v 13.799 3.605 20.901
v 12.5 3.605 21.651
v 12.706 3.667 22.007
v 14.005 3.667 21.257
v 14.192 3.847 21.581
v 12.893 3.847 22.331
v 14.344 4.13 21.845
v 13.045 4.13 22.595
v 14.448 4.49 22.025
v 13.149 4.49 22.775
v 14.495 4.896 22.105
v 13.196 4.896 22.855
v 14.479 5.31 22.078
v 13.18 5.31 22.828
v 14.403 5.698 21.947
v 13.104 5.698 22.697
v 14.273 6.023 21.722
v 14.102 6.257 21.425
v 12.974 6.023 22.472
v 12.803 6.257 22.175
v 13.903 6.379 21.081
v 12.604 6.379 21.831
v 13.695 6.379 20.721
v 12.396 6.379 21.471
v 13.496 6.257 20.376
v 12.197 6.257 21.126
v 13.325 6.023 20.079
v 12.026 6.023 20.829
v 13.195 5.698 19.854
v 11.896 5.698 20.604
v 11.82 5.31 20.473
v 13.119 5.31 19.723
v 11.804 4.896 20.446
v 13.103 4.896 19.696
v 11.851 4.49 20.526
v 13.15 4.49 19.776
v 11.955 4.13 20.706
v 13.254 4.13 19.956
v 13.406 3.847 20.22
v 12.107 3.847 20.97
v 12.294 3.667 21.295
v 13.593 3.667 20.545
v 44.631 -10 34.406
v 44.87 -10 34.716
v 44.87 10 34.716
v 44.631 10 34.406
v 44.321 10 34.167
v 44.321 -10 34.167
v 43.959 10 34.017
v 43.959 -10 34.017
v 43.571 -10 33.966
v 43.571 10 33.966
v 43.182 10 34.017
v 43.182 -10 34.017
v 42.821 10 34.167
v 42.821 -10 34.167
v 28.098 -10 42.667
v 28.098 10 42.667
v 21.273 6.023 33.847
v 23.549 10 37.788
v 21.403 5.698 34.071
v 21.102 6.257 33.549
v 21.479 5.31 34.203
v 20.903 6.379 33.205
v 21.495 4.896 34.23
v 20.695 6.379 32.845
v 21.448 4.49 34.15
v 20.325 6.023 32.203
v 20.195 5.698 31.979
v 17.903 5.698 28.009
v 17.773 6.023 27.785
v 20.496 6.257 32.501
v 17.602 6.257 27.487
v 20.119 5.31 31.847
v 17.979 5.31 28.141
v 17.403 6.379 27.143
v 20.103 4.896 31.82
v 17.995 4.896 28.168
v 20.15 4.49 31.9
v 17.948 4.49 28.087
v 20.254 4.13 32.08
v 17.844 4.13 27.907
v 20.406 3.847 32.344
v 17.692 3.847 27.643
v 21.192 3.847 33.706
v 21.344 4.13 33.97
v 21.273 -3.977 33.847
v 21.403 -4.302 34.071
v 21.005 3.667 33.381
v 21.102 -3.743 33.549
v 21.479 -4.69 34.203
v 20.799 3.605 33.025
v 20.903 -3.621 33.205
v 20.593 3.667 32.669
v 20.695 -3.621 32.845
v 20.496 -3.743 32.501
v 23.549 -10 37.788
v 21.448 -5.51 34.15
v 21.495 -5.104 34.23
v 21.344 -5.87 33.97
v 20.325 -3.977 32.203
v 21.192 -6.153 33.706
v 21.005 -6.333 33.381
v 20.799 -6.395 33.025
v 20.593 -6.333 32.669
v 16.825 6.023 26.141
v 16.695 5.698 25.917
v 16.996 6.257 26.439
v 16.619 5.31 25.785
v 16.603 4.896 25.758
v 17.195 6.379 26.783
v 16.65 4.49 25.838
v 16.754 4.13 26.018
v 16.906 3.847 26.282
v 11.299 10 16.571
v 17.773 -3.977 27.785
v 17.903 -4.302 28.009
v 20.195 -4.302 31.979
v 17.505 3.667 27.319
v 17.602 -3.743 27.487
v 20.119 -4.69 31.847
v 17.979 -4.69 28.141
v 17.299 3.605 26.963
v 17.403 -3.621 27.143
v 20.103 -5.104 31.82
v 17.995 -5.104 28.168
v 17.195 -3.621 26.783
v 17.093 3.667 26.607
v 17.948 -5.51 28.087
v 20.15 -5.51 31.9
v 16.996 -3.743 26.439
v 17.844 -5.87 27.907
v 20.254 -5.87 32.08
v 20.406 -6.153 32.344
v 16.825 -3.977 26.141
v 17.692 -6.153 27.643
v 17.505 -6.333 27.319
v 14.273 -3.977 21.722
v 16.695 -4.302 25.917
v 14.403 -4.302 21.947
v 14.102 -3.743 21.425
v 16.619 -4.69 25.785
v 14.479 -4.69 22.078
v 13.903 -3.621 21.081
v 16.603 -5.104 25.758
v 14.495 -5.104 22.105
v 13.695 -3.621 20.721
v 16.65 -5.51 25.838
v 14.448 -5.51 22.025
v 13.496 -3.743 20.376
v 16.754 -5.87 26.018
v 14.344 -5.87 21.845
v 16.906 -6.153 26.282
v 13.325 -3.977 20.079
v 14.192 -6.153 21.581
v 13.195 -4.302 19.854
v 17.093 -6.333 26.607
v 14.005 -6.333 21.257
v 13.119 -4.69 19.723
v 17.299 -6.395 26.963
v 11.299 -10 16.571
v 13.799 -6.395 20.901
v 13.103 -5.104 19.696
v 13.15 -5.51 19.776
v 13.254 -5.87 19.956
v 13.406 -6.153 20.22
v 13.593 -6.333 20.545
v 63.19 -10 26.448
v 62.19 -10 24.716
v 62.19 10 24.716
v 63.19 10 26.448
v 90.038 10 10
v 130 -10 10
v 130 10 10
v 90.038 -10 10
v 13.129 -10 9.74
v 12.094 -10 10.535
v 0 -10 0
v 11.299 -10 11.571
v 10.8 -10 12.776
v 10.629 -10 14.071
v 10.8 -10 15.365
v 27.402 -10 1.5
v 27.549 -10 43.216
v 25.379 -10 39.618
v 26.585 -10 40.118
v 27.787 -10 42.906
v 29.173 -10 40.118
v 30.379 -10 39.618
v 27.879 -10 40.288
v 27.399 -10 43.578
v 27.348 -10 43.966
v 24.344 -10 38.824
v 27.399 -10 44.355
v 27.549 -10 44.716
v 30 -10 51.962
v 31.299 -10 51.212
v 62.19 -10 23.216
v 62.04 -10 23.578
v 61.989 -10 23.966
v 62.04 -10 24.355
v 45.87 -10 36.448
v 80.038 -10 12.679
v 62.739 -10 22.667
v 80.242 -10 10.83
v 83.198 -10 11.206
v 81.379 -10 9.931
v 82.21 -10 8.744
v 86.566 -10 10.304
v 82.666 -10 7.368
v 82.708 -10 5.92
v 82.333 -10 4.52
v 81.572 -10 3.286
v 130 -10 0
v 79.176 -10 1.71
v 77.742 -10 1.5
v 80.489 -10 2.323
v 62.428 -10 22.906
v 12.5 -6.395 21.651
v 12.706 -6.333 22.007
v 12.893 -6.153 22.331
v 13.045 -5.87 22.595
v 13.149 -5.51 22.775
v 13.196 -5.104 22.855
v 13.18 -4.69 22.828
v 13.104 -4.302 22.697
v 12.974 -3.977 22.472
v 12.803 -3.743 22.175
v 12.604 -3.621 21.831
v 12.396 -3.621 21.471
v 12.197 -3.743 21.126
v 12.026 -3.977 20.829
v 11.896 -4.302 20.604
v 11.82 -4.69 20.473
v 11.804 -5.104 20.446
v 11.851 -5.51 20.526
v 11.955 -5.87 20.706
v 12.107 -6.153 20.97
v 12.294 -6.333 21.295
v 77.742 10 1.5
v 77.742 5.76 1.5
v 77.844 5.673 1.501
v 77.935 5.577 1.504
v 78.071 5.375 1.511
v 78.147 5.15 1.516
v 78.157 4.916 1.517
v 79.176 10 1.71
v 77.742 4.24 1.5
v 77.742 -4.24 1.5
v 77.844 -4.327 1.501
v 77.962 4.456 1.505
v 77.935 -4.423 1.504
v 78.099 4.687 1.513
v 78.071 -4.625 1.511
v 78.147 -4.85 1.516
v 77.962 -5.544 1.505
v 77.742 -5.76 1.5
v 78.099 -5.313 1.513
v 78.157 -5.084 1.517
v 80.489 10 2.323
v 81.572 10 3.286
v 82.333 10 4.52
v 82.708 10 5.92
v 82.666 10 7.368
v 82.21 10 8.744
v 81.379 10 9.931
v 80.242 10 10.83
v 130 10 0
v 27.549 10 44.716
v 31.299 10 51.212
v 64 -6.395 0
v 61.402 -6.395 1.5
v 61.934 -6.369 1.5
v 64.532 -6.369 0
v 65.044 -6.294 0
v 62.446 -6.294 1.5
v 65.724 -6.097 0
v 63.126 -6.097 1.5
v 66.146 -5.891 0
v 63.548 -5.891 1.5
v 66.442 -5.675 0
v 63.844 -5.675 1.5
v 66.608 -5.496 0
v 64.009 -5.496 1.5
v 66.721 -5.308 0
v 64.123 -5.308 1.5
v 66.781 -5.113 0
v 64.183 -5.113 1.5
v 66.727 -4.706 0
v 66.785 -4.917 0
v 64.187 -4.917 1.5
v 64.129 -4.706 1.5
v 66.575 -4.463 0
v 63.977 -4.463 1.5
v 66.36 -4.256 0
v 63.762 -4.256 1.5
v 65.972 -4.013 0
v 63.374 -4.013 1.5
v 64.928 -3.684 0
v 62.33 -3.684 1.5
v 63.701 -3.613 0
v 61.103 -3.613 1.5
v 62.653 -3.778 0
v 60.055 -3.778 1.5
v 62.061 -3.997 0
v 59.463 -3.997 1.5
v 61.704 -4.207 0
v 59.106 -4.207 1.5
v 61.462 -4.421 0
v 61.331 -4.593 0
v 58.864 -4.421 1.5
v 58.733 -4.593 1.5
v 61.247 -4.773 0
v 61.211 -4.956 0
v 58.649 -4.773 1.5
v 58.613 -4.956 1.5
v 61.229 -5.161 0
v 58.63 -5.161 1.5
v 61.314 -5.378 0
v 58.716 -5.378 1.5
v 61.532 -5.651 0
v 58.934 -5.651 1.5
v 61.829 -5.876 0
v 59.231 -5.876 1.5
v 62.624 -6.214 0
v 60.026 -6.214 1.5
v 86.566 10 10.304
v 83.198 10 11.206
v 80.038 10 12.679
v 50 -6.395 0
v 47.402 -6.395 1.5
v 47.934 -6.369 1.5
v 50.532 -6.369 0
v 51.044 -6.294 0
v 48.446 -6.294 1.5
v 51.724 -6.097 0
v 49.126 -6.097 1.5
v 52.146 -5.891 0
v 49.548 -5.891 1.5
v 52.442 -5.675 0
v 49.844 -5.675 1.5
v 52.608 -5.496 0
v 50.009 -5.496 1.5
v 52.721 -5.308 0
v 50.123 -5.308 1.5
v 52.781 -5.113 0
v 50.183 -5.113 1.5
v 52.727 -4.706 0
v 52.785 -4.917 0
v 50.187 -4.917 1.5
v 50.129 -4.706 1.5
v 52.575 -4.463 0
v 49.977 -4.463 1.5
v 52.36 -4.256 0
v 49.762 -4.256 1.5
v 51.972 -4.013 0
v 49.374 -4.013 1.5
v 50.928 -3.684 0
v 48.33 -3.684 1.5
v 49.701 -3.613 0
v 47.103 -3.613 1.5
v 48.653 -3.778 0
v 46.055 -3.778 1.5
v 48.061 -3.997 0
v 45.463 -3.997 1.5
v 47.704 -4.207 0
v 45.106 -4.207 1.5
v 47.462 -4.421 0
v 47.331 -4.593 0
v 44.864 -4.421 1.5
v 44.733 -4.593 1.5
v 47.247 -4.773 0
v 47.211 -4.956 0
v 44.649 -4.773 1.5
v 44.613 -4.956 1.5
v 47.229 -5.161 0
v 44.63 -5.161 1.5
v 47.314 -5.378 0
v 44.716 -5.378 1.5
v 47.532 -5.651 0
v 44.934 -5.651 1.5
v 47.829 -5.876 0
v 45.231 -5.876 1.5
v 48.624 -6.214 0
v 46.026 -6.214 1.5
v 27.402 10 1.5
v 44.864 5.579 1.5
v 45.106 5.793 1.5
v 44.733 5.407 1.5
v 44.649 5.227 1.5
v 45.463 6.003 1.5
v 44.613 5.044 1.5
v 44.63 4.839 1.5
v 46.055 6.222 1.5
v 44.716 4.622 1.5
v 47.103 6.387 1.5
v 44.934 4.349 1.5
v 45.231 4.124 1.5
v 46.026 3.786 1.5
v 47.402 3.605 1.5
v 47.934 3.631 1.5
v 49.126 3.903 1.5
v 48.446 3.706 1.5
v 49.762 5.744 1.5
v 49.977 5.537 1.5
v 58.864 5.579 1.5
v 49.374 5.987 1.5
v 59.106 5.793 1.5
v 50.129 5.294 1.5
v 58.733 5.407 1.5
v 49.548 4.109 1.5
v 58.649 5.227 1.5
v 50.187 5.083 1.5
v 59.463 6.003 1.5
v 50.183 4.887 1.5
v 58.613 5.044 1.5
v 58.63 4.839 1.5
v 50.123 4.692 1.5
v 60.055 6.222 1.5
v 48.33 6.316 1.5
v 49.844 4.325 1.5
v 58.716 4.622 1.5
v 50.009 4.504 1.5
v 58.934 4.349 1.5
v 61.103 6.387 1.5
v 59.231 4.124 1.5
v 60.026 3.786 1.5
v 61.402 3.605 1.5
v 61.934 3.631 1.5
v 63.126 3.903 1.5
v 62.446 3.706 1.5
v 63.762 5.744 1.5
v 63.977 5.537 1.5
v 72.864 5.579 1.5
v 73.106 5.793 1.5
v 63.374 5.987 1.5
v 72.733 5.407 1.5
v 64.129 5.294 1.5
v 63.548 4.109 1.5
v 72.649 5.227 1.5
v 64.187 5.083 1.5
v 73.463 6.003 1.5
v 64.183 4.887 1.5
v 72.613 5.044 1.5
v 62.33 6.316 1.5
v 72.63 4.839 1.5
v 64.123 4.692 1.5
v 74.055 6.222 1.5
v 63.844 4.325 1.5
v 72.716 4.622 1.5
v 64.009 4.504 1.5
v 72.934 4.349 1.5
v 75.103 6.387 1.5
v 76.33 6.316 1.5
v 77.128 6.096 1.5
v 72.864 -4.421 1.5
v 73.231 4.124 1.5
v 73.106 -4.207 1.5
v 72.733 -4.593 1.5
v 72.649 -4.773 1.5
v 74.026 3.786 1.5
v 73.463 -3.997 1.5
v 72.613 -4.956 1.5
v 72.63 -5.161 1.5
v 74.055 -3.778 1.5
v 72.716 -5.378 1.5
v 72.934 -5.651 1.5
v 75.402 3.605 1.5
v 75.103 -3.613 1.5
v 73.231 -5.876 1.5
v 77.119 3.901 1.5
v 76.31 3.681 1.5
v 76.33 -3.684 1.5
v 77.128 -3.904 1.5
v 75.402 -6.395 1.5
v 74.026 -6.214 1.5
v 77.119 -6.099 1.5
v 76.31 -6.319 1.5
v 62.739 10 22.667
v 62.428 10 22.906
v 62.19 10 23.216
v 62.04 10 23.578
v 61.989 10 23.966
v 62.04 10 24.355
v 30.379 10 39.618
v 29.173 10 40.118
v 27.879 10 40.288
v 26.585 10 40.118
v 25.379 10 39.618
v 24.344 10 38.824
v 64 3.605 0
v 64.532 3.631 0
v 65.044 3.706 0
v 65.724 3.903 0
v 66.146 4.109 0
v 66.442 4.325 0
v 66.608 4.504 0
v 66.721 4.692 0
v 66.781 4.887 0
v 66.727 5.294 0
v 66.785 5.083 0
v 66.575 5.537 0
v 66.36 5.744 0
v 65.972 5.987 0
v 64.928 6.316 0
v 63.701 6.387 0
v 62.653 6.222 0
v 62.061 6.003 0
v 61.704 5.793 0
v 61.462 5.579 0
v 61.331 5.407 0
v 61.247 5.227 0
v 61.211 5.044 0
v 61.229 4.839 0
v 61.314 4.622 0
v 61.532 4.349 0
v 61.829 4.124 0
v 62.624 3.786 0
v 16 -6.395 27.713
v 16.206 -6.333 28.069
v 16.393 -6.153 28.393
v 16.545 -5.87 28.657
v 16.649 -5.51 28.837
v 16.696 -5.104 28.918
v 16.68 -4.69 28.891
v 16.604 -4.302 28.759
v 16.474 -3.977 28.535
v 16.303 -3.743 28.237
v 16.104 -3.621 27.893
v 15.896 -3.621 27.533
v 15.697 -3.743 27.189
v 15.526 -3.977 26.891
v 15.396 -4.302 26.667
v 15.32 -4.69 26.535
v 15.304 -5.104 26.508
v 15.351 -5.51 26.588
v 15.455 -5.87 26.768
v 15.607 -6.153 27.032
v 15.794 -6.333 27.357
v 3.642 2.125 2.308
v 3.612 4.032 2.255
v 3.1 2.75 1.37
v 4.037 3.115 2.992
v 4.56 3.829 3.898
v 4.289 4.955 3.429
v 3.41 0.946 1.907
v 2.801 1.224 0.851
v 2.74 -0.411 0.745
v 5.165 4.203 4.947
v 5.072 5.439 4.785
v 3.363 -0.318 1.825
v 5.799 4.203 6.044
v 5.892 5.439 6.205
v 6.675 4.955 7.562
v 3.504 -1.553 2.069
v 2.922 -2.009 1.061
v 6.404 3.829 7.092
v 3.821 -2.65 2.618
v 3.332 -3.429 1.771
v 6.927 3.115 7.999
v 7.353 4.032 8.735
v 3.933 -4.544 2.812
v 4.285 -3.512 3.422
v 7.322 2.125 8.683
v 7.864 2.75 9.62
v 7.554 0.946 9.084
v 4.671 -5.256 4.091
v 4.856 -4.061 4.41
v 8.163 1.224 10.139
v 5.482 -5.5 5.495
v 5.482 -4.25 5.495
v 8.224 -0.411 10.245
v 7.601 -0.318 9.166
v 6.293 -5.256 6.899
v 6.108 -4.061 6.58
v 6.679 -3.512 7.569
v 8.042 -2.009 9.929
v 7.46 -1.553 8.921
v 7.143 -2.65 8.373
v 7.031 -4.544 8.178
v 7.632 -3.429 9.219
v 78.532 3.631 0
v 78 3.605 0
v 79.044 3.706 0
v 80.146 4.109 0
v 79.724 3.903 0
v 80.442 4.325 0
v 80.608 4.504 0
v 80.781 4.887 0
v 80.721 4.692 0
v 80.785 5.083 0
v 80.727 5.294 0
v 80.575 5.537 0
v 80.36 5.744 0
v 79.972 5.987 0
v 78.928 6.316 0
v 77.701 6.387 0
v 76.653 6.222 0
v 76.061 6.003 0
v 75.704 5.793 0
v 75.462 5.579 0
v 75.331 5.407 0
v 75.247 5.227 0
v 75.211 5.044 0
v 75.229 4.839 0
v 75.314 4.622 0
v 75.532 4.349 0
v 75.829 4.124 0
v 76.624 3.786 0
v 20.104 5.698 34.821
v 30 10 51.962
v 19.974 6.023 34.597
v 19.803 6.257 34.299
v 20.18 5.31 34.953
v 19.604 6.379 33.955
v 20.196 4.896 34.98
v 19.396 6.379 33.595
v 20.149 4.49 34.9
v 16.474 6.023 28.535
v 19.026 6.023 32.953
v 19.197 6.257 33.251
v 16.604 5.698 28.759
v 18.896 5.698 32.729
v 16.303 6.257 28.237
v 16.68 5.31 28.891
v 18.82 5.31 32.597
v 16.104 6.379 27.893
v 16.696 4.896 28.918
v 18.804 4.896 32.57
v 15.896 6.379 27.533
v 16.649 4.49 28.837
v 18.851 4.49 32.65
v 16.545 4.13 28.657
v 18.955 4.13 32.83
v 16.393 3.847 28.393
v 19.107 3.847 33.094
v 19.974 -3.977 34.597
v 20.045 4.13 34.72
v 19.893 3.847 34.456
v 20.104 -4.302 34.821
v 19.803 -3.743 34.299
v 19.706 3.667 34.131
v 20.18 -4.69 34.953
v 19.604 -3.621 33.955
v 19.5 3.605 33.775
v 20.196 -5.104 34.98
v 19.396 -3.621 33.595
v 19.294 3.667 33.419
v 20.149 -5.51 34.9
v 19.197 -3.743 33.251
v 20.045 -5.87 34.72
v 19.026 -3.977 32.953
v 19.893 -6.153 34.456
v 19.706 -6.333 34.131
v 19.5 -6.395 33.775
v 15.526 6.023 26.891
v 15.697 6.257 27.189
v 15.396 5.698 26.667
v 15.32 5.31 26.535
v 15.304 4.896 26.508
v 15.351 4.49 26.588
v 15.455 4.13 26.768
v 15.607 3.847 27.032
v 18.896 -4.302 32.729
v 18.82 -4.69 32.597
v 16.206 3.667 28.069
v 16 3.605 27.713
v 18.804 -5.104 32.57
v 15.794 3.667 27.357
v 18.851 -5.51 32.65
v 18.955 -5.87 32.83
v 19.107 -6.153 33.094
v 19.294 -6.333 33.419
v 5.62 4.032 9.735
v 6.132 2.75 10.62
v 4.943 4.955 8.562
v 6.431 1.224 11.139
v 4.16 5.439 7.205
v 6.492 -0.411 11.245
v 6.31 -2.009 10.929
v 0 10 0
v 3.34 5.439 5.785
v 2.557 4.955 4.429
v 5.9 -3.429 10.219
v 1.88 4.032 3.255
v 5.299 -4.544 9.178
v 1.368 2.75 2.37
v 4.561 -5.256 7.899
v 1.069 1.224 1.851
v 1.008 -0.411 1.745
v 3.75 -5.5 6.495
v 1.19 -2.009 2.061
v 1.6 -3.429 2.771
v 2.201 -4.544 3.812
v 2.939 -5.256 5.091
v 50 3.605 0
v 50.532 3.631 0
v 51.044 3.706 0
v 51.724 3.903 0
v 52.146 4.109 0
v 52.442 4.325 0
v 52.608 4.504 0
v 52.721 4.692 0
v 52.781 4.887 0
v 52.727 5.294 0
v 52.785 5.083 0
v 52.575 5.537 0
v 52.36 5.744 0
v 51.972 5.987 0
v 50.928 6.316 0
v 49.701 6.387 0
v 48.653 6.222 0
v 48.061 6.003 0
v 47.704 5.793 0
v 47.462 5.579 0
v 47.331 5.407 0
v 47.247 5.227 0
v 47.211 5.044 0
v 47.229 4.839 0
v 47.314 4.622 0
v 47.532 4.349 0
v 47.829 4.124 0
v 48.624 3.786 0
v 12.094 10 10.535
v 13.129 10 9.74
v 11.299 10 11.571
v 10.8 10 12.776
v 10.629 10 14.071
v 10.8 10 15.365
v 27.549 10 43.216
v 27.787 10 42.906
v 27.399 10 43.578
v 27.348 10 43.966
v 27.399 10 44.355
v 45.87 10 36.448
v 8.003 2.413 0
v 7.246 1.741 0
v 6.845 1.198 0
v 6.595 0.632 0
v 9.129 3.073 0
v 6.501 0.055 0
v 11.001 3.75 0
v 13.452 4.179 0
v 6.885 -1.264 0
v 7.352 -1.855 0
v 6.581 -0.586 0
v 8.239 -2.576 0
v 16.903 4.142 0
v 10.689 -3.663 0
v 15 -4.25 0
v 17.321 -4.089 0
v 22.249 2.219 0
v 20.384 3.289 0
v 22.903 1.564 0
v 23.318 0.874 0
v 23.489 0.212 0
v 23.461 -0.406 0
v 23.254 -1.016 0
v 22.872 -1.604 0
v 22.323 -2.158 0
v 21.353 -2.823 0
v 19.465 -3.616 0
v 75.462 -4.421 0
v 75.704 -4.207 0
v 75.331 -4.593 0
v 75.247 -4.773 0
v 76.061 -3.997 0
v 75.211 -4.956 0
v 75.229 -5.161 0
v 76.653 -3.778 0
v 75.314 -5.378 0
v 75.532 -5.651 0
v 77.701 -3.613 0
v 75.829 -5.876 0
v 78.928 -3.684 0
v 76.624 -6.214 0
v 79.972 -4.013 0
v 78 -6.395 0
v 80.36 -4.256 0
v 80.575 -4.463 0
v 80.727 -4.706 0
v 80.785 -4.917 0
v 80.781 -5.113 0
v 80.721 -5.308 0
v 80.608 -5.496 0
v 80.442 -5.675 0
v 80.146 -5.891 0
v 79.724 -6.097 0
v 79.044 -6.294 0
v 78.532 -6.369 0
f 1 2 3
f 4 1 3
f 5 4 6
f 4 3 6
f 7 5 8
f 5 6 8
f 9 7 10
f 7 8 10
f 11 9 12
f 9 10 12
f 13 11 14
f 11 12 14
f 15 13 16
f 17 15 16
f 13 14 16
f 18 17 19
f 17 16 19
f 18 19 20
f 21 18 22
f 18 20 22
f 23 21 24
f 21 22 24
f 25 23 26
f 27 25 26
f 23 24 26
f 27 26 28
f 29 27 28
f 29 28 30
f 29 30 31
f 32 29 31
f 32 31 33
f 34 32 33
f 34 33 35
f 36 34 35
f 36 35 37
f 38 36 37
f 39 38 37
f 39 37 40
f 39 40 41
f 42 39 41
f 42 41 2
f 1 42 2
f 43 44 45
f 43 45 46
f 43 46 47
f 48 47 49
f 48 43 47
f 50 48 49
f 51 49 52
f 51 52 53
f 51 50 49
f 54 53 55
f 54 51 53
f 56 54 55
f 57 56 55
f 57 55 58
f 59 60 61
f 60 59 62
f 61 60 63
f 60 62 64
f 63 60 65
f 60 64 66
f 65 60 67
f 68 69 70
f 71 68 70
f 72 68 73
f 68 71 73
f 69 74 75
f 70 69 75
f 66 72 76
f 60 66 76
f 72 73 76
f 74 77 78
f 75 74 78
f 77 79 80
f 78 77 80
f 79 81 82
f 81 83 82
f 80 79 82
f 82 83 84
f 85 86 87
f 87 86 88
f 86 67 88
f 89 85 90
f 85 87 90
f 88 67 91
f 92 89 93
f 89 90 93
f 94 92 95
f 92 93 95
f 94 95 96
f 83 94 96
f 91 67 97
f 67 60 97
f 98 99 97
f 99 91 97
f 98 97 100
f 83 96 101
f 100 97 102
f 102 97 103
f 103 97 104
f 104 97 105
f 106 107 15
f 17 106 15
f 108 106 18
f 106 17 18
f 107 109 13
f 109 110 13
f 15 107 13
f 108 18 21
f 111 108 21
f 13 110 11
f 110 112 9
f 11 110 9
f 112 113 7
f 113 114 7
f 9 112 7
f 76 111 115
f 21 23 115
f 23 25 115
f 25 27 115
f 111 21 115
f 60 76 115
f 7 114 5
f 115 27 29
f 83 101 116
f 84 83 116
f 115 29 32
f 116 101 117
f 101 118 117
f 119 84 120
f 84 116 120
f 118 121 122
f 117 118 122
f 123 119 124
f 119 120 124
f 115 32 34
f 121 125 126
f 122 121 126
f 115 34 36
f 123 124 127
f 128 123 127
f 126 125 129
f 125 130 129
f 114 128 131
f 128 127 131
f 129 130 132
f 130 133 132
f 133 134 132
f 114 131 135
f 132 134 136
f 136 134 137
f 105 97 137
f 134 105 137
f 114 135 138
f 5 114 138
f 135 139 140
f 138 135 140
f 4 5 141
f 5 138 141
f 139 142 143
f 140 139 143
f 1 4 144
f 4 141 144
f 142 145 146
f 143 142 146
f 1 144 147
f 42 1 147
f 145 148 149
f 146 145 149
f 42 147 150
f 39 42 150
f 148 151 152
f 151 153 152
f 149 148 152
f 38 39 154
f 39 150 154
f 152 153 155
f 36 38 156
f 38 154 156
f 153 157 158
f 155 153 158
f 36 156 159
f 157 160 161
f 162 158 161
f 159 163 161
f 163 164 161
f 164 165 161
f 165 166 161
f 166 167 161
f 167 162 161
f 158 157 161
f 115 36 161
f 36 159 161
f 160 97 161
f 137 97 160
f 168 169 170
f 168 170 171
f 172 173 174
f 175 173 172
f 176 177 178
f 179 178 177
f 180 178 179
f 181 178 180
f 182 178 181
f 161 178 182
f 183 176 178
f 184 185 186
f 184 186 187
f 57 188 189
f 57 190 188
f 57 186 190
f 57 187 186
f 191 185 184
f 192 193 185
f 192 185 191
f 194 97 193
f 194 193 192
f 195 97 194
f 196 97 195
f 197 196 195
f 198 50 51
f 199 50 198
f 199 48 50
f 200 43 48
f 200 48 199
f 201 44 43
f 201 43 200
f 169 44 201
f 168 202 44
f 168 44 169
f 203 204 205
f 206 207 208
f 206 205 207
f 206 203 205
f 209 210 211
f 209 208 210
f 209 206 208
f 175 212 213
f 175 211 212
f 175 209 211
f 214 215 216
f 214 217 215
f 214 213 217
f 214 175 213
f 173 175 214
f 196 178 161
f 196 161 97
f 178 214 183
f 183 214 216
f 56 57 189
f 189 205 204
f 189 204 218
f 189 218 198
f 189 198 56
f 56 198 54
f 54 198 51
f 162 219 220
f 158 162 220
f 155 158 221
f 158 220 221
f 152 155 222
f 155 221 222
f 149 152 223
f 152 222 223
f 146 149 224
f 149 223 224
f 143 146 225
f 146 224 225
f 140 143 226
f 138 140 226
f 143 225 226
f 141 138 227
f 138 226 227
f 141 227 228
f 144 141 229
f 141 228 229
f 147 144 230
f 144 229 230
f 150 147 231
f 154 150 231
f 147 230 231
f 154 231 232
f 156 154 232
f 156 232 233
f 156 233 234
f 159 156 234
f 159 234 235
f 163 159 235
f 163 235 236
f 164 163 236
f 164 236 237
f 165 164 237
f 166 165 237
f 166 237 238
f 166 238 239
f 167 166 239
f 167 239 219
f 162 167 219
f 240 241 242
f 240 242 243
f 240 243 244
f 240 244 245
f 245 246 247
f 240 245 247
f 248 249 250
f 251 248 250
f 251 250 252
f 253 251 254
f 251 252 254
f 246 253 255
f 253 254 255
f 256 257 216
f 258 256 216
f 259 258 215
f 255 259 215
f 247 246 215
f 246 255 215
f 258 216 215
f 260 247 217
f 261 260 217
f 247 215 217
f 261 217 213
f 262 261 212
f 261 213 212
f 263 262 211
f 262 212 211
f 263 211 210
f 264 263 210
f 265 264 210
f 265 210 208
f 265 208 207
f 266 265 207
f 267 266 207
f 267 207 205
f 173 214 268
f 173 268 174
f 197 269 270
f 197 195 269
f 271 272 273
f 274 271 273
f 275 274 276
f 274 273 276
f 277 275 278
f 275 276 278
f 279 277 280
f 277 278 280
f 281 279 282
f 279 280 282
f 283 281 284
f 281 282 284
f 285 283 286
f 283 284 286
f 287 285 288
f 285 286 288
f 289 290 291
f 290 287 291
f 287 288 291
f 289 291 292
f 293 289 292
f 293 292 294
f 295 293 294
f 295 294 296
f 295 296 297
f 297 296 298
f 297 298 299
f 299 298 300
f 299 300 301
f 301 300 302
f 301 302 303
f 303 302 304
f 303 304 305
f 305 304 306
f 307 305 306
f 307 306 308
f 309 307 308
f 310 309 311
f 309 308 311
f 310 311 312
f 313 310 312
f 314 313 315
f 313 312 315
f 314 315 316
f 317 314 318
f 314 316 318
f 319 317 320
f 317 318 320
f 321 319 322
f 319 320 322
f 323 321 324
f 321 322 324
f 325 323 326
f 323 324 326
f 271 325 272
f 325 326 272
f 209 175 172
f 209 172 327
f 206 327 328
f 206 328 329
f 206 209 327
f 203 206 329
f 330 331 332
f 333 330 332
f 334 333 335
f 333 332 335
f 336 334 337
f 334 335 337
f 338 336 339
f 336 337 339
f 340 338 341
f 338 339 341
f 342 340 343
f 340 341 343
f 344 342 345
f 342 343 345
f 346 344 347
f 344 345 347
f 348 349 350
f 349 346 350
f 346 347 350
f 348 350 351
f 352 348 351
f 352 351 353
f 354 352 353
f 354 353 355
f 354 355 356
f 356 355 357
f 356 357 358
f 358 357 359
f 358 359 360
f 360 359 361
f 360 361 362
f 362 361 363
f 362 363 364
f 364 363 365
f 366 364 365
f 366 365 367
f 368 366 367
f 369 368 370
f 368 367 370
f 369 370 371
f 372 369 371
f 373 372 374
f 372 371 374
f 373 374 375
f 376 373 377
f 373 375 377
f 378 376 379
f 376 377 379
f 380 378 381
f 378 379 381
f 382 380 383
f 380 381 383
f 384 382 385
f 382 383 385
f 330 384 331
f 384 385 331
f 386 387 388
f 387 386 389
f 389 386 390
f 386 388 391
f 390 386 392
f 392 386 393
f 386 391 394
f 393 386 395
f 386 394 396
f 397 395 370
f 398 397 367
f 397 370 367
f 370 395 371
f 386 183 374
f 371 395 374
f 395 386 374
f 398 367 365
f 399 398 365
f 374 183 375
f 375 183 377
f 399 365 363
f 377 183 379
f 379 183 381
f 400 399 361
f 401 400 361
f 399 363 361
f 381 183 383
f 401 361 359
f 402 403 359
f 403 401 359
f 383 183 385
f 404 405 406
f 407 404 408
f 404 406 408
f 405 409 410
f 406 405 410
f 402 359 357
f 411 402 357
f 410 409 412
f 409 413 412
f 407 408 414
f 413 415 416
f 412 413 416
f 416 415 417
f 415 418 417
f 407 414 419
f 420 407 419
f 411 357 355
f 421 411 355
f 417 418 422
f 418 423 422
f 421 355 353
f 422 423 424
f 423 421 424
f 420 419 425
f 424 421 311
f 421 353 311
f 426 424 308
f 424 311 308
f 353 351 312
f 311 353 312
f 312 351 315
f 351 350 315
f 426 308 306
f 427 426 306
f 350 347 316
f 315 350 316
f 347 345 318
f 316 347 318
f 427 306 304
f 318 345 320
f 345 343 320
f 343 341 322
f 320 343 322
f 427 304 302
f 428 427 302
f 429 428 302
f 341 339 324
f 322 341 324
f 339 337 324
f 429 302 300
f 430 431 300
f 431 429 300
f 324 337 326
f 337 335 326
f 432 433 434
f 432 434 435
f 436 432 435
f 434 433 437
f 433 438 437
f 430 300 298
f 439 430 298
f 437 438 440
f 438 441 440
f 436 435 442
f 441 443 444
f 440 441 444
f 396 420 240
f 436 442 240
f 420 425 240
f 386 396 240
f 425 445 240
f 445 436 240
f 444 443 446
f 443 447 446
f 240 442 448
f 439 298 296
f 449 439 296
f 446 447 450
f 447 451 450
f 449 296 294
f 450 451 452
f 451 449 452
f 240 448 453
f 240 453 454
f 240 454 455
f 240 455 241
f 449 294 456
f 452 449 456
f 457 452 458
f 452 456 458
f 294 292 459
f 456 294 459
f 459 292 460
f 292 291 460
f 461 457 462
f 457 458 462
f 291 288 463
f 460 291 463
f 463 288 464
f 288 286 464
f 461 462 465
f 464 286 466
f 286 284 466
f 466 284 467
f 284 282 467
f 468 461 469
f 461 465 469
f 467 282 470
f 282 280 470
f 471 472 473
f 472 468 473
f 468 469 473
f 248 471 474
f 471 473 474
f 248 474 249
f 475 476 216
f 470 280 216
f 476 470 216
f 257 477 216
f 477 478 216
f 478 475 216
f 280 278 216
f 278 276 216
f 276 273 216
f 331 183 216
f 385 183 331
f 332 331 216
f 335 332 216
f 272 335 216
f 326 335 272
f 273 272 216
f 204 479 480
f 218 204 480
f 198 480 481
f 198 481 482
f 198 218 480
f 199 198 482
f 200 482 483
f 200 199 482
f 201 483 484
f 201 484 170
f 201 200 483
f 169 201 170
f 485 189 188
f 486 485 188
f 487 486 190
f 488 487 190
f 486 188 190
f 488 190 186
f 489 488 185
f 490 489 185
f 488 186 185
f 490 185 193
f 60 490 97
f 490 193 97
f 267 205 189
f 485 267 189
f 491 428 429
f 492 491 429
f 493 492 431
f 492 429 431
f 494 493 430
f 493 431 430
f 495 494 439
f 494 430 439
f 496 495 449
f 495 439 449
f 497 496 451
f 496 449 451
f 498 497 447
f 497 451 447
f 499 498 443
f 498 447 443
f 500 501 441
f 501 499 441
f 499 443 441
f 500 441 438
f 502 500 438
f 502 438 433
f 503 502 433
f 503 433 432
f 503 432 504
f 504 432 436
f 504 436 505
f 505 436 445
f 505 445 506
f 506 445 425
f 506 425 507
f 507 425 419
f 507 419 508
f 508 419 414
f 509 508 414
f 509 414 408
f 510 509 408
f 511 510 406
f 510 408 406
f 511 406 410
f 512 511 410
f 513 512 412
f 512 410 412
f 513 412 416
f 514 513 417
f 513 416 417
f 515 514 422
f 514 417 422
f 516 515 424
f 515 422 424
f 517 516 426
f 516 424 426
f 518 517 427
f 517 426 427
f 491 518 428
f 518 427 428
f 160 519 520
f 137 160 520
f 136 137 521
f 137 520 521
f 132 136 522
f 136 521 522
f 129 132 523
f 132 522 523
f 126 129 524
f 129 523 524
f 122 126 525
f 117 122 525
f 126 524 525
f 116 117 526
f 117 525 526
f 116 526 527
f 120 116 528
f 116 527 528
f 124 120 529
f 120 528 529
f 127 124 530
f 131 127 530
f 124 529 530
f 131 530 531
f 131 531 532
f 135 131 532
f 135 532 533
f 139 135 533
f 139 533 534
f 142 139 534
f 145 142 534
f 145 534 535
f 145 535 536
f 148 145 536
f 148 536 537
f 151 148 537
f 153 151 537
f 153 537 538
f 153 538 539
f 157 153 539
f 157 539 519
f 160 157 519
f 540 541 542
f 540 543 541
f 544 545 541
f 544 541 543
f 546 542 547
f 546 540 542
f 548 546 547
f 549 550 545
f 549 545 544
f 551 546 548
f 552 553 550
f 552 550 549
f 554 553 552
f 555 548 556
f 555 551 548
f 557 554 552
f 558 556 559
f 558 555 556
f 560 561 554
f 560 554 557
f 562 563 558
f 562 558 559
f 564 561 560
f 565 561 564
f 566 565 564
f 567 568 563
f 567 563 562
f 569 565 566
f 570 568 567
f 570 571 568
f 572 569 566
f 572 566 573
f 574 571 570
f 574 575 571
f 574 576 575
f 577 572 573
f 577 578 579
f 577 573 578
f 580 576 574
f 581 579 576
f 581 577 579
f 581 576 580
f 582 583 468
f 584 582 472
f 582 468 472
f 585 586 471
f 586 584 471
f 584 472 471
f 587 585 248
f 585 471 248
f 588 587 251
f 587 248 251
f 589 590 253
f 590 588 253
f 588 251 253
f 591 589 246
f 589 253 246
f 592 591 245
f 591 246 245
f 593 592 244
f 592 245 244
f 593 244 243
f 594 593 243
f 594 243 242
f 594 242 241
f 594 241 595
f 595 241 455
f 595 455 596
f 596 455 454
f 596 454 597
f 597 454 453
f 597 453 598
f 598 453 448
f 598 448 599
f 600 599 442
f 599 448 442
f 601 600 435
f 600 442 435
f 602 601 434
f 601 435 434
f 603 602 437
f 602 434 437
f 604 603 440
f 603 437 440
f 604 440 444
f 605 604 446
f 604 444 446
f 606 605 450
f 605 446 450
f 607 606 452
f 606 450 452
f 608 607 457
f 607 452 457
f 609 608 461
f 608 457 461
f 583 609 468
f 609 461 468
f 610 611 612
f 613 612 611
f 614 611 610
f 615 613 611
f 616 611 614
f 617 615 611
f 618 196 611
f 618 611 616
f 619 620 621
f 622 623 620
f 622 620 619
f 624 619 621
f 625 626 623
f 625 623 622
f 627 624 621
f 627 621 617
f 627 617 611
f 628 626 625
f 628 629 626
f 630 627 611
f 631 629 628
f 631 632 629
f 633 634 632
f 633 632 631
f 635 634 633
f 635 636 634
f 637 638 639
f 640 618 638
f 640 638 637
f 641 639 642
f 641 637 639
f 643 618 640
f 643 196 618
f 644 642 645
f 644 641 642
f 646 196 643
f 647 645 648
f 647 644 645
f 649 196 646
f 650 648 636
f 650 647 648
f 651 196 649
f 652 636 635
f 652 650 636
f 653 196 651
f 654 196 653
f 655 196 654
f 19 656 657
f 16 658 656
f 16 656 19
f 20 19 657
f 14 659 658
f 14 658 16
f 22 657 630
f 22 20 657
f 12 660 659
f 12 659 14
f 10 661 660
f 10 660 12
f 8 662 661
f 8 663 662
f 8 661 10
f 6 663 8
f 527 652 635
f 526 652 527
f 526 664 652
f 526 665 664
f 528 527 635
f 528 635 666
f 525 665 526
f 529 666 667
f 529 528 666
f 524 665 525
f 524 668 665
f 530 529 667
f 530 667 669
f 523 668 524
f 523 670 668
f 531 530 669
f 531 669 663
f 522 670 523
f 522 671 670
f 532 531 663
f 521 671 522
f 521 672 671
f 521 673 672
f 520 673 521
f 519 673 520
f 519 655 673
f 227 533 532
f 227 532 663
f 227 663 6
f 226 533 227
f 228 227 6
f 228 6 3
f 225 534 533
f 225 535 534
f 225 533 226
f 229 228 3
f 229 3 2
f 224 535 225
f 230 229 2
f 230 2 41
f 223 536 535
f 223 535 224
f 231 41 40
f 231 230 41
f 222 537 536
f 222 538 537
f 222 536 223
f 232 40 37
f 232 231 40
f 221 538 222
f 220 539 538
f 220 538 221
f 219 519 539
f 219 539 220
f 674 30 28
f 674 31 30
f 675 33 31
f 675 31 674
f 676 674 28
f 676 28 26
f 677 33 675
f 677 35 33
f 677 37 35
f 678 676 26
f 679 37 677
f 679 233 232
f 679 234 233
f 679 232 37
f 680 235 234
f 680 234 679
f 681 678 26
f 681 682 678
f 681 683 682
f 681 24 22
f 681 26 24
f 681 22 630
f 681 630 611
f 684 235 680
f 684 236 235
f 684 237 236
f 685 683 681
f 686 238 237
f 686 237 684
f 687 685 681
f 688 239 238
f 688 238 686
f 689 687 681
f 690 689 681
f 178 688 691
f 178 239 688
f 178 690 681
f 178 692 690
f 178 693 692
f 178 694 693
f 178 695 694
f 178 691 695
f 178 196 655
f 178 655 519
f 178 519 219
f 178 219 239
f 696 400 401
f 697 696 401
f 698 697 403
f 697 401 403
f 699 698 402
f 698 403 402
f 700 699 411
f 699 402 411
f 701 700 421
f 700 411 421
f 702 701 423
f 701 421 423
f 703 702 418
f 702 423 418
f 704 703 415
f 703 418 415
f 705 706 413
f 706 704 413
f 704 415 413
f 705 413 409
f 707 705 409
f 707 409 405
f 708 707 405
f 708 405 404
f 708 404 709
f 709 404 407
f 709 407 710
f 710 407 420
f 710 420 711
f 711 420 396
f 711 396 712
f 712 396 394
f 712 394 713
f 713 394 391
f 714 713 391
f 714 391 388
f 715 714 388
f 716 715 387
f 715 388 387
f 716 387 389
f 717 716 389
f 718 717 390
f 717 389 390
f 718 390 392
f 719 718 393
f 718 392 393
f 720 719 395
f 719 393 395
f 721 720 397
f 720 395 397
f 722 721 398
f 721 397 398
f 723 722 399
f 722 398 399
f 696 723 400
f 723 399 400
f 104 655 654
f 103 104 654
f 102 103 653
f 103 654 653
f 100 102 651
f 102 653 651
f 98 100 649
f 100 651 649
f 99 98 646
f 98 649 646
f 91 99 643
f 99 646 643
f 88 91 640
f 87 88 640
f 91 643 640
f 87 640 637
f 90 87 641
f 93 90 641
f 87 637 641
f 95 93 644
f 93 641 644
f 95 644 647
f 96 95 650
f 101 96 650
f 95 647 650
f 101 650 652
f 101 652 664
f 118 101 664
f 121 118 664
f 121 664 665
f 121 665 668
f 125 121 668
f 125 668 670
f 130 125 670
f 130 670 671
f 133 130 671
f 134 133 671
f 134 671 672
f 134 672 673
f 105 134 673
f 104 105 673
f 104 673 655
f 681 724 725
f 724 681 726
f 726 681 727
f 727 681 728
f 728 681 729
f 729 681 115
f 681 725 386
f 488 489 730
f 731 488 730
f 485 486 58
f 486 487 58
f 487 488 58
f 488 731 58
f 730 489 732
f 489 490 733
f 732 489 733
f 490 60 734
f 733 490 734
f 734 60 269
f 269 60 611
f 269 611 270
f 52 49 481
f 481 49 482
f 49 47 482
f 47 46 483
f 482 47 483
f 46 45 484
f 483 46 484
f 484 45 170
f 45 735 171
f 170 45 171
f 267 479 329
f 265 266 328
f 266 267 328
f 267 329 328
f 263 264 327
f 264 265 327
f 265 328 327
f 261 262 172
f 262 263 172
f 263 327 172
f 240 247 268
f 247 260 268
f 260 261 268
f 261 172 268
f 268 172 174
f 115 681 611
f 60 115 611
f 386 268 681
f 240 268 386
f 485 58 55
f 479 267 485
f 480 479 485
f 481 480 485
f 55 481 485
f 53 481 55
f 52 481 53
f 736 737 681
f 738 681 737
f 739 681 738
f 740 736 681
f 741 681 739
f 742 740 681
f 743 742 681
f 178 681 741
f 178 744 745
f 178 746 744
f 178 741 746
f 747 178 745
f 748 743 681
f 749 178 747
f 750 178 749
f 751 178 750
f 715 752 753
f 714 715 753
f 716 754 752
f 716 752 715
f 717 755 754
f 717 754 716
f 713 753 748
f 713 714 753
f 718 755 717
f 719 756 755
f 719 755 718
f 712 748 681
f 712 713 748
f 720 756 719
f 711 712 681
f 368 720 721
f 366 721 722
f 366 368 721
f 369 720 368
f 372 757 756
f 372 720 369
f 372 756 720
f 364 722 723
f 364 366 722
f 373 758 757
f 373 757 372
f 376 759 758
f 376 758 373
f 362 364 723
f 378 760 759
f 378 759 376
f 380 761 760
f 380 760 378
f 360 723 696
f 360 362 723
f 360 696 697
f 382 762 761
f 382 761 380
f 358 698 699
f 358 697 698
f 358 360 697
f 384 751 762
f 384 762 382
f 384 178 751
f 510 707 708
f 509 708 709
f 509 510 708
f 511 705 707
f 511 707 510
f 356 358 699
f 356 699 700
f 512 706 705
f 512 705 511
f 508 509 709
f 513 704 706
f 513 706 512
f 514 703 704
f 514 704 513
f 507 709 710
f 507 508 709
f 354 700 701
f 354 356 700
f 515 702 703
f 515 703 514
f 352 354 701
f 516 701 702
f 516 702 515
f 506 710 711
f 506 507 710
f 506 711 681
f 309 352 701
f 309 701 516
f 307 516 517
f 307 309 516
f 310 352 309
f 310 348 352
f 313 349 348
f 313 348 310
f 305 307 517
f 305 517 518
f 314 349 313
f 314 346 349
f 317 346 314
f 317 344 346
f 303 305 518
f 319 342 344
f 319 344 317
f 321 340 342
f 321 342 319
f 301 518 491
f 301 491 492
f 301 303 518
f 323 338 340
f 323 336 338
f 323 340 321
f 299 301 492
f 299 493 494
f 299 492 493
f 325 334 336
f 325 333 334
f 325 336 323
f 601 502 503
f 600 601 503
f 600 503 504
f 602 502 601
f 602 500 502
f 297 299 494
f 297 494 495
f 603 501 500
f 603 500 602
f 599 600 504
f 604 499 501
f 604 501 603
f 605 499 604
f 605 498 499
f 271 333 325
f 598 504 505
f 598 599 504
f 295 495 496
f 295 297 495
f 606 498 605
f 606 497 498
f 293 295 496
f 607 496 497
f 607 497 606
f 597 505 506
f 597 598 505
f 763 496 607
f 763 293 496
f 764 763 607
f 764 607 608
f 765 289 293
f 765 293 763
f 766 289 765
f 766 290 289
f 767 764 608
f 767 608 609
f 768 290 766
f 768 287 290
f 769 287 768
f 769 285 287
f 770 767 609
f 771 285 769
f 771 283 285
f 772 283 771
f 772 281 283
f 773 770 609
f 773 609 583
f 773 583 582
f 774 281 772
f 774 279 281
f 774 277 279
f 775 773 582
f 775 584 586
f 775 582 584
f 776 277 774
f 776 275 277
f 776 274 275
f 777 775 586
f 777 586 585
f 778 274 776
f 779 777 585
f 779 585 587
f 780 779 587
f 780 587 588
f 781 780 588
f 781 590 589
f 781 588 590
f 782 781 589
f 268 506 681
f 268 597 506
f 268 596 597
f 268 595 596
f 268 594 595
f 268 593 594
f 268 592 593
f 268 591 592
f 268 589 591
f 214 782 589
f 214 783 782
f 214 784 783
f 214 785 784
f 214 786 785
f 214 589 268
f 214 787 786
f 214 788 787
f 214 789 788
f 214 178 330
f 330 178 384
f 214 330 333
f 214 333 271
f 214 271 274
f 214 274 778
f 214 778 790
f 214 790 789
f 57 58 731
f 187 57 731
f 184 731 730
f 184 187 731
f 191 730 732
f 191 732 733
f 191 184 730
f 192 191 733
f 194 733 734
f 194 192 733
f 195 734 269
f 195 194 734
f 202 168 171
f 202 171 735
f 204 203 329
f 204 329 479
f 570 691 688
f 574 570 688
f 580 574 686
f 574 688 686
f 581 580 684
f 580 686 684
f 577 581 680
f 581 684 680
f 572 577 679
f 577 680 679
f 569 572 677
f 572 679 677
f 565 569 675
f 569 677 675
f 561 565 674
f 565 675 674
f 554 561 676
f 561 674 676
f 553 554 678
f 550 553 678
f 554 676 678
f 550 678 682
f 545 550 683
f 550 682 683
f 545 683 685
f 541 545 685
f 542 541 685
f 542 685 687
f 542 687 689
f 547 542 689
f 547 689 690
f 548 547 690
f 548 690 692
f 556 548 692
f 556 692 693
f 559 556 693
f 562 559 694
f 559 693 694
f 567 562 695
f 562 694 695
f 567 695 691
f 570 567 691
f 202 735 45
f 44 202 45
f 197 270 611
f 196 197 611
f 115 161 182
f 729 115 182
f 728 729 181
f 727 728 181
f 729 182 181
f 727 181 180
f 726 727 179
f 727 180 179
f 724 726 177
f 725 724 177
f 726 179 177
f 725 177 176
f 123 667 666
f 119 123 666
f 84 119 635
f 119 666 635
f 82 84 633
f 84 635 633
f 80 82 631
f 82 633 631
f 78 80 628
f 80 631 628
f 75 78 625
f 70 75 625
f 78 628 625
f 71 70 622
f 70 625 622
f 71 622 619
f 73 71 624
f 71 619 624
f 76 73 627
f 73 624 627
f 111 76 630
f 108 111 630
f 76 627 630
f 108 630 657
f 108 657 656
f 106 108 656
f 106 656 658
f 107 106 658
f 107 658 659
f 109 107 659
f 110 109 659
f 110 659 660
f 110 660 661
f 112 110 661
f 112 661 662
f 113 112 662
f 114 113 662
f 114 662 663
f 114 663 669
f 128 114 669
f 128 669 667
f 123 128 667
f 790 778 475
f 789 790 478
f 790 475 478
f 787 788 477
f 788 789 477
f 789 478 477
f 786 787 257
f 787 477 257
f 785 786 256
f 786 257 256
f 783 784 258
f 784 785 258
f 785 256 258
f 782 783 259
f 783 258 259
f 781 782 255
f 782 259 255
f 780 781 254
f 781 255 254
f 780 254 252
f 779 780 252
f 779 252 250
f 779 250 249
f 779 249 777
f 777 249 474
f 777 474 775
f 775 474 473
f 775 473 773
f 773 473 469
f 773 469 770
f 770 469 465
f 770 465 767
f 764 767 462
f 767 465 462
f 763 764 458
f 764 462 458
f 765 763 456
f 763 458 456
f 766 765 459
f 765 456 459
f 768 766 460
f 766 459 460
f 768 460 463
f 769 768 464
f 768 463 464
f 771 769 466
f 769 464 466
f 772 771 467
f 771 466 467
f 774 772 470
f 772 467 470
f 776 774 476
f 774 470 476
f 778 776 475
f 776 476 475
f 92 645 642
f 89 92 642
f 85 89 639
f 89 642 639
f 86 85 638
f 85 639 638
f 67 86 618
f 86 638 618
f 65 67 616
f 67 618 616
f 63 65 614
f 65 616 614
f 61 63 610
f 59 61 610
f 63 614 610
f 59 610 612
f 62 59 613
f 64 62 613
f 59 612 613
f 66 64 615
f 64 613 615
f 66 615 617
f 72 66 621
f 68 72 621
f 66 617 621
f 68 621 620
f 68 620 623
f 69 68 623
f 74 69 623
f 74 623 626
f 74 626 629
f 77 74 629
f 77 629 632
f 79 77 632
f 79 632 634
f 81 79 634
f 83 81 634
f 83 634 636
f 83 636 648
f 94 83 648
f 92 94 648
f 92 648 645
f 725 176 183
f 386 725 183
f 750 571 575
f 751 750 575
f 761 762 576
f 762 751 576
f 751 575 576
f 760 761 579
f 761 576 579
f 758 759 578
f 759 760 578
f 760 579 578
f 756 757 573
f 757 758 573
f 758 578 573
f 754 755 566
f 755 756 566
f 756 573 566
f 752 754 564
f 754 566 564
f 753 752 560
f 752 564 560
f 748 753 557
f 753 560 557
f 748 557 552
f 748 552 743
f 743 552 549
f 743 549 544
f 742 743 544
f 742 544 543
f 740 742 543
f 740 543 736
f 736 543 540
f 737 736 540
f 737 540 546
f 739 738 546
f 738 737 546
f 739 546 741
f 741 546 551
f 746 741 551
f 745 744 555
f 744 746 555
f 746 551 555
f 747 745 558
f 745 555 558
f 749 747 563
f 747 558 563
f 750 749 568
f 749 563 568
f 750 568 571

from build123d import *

# Parameters (mm, degrees)
F1_DEPTH = 10
F3_DEPTH = 20
F4_R     = 4.25
F5_DEPTH = 112.584302492
F4_R_2   = 5.5
F6_DEPTH = 2
F4_R_3   = 1.395
F7_DEPTH = 112.584302492


with BuildPart() as f1:
    # F0 (on Front) → F1 (new body, symmetric)
    with BuildSketch(Plane.XZ):
        with BuildLine():
            Line((30, 51.9615242271), (0, 0))
            Line((0, 0), (130, 0))
            Line((130, 0), (130, 10))
            Line((130, 10), (90.0384757729, 10))
            ThreePointArc((90.0384757729, 10), (84.8620948709, 10.6814834742), (80.0384757729, 12.6794919243))
            Line((80.0384757729, 12.6794919243), (62.7390923627, 22.667295593))
            ThreePointArc((62.7390923627, 22.667295593), (62.0402036233, 23.578105131), (62.1900542571, 24.7163336987))
            Line((62.1900542571, 24.7163336987), (63.1900542571, 26.4483845063))
            Line((63.1900542571, 26.4483845063), (45.8695461814, 36.4483845063))
            Line((45.8695461814, 36.4483845063), (44.8695461814, 34.7163336987))
            ThreePointArc((44.8695461814, 34.7163336987), (43.9587366433, 34.0174449592), (42.8205080757, 34.167295593))
            Line((42.8205080757, 34.167295593), (28.0980762114, 42.667295593))
            ThreePointArc((28.0980762114, 42.667295593), (27.3991874719, 43.578105131), (27.5490381057, 44.7163336987))
            Line((27.5490381057, 44.7163336987), (31.2990381057, 51.2115242271))
            Line((31.2990381057, 51.2115242271), (30, 51.9615242271))
        make_face()
    extrude(amount=F1_DEPTH, both=True)

    # F2 (on face) → F3 (cut)
    with BuildSketch(Plane.XZ.offset(10)):
        with BuildLine():
            ThreePointArc((30.3791651246, 39.6182574873), (26.5850698991, 40.1177595999), (23.5490381057, 37.7881304684))
            Line((23.5490381057, 37.7881304684), (11.2990381057, 16.5705080757))
            ThreePointArc((11.2990381057, 16.5705080757), (10.7995359932, 12.7764128502), (13.1291651246, 9.7403810568))
            Line((13.1291651246, 9.7403810568), (27.4019237886, 1.5))
            Line((27.4019237886, 1.5), (77.7416697508, 1.5))
            ThreePointArc((77.7416697508, 1.5), (82.5712988822, 5.2059047745), (80.2416697508, 10.8301270189))
            Line((80.2416697508, 10.8301270189), (30.3791651246, 39.6182574873))
        make_face()
    extrude(amount=-F3_DEPTH, mode=Mode.SUBTRACT)

    # F4 (on face) → F5 (cut, through all)
    with BuildSketch(Plane(origin=(0, 0, 0), x_dir=(0, -1, 0), z_dir=(-0.8660254038, 0, 0.5))):
        with Locations((0, 7.5)):
            Circle(F4_R)
    extrude(amount=-F5_DEPTH, mode=Mode.SUBTRACT)

    # F4 (on face) → F6 (cut)
    with BuildSketch(Plane(origin=(0, 0, 0), x_dir=(0, -1, 0), z_dir=(-0.8660254038, 0, 0.5))):
        with Locations((0, 7.5)):
            Circle(F4_R_2)
        with Locations((0, 7.5)):
            Circle(F4_R, mode=Mode.SUBTRACT)
    extrude(amount=-F6_DEPTH, mode=Mode.SUBTRACT)

    # F4 (on face) → F7 (cut, through all)
    with BuildSketch(Plane(origin=(0, 0, 0), x_dir=(0, -1, 0), z_dir=(-0.8660254038, 0, 0.5))):
        with Locations((-5, 25)):
            Circle(F4_R_3)
        with Locations((5, 32)):
            Circle(F4_R_3)
        with Locations((-5, 32)):
            Circle(F4_R_3)
        with Locations((5, 39)):
            Circle(F4_R_3)
        with Locations((-5, 39)):
            Circle(F4_R_3)
        with Locations((5, 25)):
            Circle(F4_R_3)
    extrude(amount=-F7_DEPTH, mode=Mode.SUBTRACT)


solid = f1.part
